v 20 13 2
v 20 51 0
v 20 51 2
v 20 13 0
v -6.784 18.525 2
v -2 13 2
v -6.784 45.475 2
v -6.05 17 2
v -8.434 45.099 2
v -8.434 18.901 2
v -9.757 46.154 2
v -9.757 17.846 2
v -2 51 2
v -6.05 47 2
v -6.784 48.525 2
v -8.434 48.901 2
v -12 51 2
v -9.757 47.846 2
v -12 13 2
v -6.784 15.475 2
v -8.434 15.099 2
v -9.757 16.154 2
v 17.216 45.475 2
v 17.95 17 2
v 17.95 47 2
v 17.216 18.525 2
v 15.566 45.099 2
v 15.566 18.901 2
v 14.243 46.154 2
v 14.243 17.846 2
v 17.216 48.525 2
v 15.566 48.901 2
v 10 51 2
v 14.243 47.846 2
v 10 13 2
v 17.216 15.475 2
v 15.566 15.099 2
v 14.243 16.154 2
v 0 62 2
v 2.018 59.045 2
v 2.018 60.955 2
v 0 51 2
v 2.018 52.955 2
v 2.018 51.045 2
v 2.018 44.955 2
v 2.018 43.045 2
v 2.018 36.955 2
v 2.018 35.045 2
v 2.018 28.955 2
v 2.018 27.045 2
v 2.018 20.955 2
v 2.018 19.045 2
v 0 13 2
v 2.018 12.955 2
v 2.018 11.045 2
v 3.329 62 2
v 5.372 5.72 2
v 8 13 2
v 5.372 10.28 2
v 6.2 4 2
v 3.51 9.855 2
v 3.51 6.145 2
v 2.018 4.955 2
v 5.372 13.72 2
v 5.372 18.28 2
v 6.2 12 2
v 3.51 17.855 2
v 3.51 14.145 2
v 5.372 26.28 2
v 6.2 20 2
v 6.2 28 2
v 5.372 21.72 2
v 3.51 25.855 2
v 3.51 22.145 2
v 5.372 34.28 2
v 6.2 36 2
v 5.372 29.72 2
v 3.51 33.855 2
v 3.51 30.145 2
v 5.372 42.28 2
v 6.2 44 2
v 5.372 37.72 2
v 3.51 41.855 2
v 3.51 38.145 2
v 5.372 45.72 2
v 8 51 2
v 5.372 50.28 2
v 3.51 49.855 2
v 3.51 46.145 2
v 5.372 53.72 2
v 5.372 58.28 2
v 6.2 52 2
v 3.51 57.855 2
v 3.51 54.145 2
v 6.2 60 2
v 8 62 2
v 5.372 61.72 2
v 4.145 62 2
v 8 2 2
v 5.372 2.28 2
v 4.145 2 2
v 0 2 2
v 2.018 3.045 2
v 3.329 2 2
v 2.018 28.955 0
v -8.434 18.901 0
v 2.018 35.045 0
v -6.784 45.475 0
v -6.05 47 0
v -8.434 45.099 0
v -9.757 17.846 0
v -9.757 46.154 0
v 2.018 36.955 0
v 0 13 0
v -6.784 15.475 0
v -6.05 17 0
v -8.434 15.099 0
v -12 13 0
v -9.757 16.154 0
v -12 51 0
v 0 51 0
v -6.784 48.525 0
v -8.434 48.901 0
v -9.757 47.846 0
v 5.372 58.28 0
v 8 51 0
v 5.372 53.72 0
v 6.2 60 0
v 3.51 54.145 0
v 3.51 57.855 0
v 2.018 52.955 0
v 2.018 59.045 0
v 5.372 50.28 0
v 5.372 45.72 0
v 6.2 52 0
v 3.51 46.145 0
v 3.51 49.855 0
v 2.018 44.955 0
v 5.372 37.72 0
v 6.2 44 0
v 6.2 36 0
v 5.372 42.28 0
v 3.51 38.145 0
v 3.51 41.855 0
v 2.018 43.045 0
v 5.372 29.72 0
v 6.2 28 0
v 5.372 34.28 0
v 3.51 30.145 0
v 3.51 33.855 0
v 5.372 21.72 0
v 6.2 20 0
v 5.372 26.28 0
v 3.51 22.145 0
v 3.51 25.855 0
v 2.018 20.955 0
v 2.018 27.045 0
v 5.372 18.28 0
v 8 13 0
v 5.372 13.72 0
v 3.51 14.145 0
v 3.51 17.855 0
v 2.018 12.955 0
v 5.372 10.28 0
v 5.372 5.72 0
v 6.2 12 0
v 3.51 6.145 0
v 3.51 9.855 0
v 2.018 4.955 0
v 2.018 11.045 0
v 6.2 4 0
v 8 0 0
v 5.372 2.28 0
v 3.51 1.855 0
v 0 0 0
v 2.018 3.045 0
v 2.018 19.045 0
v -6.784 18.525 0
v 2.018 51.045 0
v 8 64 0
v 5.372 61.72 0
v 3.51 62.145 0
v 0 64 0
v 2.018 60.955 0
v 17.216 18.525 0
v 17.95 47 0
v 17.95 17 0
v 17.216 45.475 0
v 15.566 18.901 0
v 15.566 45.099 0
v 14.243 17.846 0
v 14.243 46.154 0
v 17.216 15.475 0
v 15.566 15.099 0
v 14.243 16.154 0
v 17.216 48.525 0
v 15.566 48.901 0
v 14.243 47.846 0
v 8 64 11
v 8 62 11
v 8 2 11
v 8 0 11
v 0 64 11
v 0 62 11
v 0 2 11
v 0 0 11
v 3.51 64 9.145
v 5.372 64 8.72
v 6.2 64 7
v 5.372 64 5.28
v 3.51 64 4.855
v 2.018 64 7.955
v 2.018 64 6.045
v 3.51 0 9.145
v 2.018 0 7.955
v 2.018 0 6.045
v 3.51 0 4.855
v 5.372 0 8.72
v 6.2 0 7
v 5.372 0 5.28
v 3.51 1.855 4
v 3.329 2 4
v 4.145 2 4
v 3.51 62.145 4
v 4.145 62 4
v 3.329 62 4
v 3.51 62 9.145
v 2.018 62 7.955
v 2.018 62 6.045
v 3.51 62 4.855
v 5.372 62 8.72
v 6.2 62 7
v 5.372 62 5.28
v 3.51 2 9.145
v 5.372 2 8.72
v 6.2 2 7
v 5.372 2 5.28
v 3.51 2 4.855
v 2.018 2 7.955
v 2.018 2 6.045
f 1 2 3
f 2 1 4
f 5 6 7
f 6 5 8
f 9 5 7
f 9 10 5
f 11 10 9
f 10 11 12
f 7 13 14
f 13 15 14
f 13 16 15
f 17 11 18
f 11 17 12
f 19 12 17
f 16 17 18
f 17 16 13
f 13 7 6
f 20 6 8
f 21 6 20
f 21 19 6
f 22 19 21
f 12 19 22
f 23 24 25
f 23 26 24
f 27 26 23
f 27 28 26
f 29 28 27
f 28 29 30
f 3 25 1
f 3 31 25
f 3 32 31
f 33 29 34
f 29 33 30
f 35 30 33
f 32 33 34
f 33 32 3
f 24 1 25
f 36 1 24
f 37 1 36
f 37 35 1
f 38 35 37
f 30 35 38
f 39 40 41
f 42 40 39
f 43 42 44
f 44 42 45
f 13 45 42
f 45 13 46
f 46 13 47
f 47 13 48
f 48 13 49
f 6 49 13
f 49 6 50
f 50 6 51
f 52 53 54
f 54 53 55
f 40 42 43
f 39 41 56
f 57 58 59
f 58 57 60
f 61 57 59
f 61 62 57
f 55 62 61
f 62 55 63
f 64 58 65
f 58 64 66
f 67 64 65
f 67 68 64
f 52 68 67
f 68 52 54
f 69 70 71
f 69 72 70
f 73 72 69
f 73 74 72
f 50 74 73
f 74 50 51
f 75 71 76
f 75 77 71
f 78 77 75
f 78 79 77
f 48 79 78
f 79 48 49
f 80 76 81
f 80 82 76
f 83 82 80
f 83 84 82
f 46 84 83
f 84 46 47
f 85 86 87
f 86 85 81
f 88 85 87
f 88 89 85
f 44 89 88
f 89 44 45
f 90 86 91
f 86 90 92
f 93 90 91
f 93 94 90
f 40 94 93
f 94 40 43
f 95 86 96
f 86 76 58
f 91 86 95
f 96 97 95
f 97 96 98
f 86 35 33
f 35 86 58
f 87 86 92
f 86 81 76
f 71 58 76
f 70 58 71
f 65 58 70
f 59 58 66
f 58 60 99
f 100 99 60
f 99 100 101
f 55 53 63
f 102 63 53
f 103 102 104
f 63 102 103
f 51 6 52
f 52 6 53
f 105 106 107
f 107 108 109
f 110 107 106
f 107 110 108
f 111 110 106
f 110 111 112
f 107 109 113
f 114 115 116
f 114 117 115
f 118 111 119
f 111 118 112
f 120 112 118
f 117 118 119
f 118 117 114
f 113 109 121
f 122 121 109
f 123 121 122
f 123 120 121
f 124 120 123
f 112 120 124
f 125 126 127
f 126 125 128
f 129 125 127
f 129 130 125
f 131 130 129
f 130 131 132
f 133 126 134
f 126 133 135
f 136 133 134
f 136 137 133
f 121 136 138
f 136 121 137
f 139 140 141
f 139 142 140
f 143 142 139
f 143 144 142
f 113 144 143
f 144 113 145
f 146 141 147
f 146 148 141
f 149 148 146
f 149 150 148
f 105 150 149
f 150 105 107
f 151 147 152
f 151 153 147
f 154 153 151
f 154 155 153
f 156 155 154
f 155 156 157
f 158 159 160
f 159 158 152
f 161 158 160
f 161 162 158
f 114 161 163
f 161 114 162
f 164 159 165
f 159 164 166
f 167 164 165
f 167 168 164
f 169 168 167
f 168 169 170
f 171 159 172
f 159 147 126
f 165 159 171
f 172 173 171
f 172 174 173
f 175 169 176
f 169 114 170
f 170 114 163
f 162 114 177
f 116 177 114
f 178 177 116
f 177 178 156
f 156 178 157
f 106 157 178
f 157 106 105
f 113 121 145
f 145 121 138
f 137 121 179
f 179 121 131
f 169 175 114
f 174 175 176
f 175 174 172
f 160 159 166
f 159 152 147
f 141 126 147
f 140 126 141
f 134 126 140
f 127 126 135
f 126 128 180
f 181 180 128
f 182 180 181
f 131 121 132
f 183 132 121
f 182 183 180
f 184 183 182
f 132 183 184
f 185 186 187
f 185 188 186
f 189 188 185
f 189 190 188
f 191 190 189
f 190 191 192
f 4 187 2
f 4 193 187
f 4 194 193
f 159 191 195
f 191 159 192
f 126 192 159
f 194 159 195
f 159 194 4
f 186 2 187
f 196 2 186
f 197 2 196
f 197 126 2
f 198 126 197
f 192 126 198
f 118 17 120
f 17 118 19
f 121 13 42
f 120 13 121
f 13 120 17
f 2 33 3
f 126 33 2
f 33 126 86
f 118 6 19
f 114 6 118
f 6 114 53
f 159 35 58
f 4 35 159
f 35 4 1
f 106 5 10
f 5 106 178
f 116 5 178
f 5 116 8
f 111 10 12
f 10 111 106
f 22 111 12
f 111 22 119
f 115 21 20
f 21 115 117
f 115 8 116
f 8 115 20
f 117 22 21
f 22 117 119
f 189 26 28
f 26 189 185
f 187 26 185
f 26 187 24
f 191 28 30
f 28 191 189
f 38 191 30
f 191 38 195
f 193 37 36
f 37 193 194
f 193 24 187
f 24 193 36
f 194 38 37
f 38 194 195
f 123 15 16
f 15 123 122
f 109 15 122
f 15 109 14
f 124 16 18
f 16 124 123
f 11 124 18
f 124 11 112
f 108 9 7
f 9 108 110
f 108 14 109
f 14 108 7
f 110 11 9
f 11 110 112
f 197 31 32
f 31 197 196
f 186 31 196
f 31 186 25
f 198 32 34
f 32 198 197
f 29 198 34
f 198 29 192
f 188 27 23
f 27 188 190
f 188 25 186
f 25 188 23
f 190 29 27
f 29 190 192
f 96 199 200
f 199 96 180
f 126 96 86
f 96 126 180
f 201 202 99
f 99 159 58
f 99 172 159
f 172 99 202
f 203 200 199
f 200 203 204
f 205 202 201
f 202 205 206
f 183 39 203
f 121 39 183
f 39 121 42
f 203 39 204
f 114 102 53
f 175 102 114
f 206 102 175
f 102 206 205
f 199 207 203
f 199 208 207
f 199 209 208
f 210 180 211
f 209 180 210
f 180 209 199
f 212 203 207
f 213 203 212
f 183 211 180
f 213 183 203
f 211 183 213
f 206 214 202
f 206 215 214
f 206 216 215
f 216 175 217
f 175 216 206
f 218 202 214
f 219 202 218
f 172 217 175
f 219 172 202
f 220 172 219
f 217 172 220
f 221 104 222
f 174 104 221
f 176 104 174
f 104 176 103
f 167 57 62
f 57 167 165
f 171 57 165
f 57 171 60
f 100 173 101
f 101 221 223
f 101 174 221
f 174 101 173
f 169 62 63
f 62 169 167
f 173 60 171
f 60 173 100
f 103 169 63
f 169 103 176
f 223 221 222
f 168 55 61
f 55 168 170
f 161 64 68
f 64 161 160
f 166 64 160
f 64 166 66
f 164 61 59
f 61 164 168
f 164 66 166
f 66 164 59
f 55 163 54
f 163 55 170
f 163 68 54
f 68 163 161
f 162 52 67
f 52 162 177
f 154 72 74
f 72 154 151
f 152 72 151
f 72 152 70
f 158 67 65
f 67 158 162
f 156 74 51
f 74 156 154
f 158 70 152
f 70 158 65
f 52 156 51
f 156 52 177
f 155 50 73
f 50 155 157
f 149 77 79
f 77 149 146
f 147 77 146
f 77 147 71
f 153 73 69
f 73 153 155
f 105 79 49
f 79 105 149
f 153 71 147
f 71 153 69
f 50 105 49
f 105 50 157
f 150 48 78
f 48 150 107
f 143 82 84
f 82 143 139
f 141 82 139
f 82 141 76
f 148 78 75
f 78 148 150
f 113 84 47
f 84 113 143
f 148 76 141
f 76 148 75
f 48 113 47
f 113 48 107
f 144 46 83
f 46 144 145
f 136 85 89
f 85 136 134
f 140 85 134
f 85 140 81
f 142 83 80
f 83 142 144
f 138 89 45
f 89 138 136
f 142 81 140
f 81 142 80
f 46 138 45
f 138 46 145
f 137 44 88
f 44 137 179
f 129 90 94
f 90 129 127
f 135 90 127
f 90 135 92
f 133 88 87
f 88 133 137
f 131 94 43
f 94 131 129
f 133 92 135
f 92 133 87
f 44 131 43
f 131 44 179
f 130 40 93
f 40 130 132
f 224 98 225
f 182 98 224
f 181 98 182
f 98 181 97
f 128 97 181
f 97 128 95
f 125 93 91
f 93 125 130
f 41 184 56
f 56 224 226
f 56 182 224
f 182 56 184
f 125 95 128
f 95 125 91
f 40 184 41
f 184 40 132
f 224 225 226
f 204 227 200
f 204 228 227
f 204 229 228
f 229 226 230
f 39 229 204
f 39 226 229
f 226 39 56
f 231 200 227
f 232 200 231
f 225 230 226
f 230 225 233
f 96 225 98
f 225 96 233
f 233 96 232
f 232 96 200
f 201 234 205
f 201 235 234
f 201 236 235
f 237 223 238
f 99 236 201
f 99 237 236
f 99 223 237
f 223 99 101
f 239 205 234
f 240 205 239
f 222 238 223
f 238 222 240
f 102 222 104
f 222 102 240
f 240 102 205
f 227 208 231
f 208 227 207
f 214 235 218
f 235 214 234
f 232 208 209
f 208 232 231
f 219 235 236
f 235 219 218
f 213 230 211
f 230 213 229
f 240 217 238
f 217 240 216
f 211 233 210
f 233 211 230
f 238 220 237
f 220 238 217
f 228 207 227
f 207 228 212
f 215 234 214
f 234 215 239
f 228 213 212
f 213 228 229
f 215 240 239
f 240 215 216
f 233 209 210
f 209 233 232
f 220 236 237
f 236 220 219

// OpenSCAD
// configuration
space = 4;
hole = 4;
pad = space/2;
length = 1;
width = 8;
thickness = 2;

support_length = 38;
support_width = 32;
hole_length = 30;
hole_width = 24;
support_hole = 3.5;
support_desc = 1;

l = length*hole + (length-1)*space + 2*pad;
w = width*hole + (width-1)*space + 2*pad;
h = hole + 3*pad + support_desc;

difference() {
    
    union() {

        // total piece
        cube([l, w, h]);

        // freewheel support
        translate([
            -support_width/2 + l/2,
            (w - support_length)/2,
            0
        ]) {
            difference() {
                cube([support_width, support_length, thickness]);

                translate([
                    (support_width - hole_width - support_hole)/2 + support_hole/2,
                    (support_length - hole_length - support_hole)/2 + support_hole/2,
                    -thickness
                ]) {
                    cylinder(h = 3*thickness, r = support_hole/2 + 0.2);
                }

                translate([
                    (support_width - hole_width - support_hole)/2 + support_hole/2 + hole_width,
                    (support_length - hole_length - support_hole)/2 + support_hole/2,
                    -thickness
                ]) {
                    cylinder(h = 3*thickness, r = support_hole/2 + 0.2);
                }

                translate([
                    (support_width - hole_width - support_hole)/2 + support_hole/2,
                    (support_length - hole_length - support_hole)/2 + support_hole/2 + hole_length,
                    -thickness
                ]) {
                    cylinder(h = 3*thickness, r = support_hole/2 + 0.2);
                }

                translate([
                    (support_width - hole_width - support_hole)/2 + support_hole/2 + hole_width,
                    (support_length - hole_length - support_hole)/2 + support_hole/2 + hole_length,
                    -thickness
                ]) {
                    cylinder(h = 3*thickness, r = support_hole/2 + 0.2);
                }
            }
        }
    }
    
    // hollow internal
    translate([-pad, pad, pad]) {
        cube([l + 2*pad, w - 2*pad, h]);
    };
    
    // horizontal holes
    for(i=[1:length]) {
        translate([
            i*hole + (i - 1)*space - hole/2 + pad,
            w/2,
            2*pad + hole/2 + support_desc
        ]) {
            rotate([90, 0, 0]) {
                translate([0, 0, -w/2 -pad]) {
                    cylinder(h=w + 2*pad, r=hole/2 + 0.2);
                };
            };
        };
    };

    // vertical holes
    for (i=[1:length]) {
        for (j=[1:width]) {
            translate([
                i*hole + (i-1)*space - hole/2 + pad,
                j*hole + (j-1)*space - hole/2 + pad,
                -pad
            ]) {
                cylinder(h=3*pad, r=hole/2 + 0.2);
            }
        }
    }
    
    // support holes
};
